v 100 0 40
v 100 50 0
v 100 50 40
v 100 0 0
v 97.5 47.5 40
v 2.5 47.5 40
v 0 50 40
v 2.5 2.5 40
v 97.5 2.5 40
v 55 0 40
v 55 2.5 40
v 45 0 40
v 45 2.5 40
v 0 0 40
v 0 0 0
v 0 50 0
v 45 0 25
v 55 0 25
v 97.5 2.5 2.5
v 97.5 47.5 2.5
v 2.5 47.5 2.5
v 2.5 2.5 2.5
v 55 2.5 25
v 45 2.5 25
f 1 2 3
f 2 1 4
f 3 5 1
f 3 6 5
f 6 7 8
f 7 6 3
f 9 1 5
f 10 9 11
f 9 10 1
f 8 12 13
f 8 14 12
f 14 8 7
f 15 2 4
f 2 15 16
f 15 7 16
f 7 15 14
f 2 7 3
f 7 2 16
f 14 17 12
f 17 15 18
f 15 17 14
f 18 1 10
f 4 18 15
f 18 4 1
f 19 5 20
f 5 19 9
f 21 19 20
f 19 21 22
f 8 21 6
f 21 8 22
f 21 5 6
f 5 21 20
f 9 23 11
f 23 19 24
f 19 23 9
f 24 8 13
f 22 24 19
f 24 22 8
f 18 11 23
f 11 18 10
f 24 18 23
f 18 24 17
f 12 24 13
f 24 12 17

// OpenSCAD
$fn = 32;

// ----------------------------------------------------------------------
// Enclosure box: notch enclosure
// ----------------------------------------------------------------------

// --- parameters (mm) ---
box_l = 100;              // outer length, X
box_w = 50;               // outer width, Y
box_h = 40;               // outer height
wall_t = 2.5;             // wall thickness
notch_w = 10;             // cable notch width
notch_h = 15;             // cable notch height

inner_h = box_h - wall_t;  // cavity depth
boss_h = inner_h - 2;  // corner boss height

difference() {
  cube([box_l, box_w, box_h]);
  translate([wall_t, wall_t, wall_t])
    cube([box_l - 2 * wall_t, box_w - 2 * wall_t, box_h]);
  translate([box_l / 2 - notch_w / 2, -1, box_h - notch_h])
    cube([notch_w, wall_t + 2, notch_h + 1]);
}
